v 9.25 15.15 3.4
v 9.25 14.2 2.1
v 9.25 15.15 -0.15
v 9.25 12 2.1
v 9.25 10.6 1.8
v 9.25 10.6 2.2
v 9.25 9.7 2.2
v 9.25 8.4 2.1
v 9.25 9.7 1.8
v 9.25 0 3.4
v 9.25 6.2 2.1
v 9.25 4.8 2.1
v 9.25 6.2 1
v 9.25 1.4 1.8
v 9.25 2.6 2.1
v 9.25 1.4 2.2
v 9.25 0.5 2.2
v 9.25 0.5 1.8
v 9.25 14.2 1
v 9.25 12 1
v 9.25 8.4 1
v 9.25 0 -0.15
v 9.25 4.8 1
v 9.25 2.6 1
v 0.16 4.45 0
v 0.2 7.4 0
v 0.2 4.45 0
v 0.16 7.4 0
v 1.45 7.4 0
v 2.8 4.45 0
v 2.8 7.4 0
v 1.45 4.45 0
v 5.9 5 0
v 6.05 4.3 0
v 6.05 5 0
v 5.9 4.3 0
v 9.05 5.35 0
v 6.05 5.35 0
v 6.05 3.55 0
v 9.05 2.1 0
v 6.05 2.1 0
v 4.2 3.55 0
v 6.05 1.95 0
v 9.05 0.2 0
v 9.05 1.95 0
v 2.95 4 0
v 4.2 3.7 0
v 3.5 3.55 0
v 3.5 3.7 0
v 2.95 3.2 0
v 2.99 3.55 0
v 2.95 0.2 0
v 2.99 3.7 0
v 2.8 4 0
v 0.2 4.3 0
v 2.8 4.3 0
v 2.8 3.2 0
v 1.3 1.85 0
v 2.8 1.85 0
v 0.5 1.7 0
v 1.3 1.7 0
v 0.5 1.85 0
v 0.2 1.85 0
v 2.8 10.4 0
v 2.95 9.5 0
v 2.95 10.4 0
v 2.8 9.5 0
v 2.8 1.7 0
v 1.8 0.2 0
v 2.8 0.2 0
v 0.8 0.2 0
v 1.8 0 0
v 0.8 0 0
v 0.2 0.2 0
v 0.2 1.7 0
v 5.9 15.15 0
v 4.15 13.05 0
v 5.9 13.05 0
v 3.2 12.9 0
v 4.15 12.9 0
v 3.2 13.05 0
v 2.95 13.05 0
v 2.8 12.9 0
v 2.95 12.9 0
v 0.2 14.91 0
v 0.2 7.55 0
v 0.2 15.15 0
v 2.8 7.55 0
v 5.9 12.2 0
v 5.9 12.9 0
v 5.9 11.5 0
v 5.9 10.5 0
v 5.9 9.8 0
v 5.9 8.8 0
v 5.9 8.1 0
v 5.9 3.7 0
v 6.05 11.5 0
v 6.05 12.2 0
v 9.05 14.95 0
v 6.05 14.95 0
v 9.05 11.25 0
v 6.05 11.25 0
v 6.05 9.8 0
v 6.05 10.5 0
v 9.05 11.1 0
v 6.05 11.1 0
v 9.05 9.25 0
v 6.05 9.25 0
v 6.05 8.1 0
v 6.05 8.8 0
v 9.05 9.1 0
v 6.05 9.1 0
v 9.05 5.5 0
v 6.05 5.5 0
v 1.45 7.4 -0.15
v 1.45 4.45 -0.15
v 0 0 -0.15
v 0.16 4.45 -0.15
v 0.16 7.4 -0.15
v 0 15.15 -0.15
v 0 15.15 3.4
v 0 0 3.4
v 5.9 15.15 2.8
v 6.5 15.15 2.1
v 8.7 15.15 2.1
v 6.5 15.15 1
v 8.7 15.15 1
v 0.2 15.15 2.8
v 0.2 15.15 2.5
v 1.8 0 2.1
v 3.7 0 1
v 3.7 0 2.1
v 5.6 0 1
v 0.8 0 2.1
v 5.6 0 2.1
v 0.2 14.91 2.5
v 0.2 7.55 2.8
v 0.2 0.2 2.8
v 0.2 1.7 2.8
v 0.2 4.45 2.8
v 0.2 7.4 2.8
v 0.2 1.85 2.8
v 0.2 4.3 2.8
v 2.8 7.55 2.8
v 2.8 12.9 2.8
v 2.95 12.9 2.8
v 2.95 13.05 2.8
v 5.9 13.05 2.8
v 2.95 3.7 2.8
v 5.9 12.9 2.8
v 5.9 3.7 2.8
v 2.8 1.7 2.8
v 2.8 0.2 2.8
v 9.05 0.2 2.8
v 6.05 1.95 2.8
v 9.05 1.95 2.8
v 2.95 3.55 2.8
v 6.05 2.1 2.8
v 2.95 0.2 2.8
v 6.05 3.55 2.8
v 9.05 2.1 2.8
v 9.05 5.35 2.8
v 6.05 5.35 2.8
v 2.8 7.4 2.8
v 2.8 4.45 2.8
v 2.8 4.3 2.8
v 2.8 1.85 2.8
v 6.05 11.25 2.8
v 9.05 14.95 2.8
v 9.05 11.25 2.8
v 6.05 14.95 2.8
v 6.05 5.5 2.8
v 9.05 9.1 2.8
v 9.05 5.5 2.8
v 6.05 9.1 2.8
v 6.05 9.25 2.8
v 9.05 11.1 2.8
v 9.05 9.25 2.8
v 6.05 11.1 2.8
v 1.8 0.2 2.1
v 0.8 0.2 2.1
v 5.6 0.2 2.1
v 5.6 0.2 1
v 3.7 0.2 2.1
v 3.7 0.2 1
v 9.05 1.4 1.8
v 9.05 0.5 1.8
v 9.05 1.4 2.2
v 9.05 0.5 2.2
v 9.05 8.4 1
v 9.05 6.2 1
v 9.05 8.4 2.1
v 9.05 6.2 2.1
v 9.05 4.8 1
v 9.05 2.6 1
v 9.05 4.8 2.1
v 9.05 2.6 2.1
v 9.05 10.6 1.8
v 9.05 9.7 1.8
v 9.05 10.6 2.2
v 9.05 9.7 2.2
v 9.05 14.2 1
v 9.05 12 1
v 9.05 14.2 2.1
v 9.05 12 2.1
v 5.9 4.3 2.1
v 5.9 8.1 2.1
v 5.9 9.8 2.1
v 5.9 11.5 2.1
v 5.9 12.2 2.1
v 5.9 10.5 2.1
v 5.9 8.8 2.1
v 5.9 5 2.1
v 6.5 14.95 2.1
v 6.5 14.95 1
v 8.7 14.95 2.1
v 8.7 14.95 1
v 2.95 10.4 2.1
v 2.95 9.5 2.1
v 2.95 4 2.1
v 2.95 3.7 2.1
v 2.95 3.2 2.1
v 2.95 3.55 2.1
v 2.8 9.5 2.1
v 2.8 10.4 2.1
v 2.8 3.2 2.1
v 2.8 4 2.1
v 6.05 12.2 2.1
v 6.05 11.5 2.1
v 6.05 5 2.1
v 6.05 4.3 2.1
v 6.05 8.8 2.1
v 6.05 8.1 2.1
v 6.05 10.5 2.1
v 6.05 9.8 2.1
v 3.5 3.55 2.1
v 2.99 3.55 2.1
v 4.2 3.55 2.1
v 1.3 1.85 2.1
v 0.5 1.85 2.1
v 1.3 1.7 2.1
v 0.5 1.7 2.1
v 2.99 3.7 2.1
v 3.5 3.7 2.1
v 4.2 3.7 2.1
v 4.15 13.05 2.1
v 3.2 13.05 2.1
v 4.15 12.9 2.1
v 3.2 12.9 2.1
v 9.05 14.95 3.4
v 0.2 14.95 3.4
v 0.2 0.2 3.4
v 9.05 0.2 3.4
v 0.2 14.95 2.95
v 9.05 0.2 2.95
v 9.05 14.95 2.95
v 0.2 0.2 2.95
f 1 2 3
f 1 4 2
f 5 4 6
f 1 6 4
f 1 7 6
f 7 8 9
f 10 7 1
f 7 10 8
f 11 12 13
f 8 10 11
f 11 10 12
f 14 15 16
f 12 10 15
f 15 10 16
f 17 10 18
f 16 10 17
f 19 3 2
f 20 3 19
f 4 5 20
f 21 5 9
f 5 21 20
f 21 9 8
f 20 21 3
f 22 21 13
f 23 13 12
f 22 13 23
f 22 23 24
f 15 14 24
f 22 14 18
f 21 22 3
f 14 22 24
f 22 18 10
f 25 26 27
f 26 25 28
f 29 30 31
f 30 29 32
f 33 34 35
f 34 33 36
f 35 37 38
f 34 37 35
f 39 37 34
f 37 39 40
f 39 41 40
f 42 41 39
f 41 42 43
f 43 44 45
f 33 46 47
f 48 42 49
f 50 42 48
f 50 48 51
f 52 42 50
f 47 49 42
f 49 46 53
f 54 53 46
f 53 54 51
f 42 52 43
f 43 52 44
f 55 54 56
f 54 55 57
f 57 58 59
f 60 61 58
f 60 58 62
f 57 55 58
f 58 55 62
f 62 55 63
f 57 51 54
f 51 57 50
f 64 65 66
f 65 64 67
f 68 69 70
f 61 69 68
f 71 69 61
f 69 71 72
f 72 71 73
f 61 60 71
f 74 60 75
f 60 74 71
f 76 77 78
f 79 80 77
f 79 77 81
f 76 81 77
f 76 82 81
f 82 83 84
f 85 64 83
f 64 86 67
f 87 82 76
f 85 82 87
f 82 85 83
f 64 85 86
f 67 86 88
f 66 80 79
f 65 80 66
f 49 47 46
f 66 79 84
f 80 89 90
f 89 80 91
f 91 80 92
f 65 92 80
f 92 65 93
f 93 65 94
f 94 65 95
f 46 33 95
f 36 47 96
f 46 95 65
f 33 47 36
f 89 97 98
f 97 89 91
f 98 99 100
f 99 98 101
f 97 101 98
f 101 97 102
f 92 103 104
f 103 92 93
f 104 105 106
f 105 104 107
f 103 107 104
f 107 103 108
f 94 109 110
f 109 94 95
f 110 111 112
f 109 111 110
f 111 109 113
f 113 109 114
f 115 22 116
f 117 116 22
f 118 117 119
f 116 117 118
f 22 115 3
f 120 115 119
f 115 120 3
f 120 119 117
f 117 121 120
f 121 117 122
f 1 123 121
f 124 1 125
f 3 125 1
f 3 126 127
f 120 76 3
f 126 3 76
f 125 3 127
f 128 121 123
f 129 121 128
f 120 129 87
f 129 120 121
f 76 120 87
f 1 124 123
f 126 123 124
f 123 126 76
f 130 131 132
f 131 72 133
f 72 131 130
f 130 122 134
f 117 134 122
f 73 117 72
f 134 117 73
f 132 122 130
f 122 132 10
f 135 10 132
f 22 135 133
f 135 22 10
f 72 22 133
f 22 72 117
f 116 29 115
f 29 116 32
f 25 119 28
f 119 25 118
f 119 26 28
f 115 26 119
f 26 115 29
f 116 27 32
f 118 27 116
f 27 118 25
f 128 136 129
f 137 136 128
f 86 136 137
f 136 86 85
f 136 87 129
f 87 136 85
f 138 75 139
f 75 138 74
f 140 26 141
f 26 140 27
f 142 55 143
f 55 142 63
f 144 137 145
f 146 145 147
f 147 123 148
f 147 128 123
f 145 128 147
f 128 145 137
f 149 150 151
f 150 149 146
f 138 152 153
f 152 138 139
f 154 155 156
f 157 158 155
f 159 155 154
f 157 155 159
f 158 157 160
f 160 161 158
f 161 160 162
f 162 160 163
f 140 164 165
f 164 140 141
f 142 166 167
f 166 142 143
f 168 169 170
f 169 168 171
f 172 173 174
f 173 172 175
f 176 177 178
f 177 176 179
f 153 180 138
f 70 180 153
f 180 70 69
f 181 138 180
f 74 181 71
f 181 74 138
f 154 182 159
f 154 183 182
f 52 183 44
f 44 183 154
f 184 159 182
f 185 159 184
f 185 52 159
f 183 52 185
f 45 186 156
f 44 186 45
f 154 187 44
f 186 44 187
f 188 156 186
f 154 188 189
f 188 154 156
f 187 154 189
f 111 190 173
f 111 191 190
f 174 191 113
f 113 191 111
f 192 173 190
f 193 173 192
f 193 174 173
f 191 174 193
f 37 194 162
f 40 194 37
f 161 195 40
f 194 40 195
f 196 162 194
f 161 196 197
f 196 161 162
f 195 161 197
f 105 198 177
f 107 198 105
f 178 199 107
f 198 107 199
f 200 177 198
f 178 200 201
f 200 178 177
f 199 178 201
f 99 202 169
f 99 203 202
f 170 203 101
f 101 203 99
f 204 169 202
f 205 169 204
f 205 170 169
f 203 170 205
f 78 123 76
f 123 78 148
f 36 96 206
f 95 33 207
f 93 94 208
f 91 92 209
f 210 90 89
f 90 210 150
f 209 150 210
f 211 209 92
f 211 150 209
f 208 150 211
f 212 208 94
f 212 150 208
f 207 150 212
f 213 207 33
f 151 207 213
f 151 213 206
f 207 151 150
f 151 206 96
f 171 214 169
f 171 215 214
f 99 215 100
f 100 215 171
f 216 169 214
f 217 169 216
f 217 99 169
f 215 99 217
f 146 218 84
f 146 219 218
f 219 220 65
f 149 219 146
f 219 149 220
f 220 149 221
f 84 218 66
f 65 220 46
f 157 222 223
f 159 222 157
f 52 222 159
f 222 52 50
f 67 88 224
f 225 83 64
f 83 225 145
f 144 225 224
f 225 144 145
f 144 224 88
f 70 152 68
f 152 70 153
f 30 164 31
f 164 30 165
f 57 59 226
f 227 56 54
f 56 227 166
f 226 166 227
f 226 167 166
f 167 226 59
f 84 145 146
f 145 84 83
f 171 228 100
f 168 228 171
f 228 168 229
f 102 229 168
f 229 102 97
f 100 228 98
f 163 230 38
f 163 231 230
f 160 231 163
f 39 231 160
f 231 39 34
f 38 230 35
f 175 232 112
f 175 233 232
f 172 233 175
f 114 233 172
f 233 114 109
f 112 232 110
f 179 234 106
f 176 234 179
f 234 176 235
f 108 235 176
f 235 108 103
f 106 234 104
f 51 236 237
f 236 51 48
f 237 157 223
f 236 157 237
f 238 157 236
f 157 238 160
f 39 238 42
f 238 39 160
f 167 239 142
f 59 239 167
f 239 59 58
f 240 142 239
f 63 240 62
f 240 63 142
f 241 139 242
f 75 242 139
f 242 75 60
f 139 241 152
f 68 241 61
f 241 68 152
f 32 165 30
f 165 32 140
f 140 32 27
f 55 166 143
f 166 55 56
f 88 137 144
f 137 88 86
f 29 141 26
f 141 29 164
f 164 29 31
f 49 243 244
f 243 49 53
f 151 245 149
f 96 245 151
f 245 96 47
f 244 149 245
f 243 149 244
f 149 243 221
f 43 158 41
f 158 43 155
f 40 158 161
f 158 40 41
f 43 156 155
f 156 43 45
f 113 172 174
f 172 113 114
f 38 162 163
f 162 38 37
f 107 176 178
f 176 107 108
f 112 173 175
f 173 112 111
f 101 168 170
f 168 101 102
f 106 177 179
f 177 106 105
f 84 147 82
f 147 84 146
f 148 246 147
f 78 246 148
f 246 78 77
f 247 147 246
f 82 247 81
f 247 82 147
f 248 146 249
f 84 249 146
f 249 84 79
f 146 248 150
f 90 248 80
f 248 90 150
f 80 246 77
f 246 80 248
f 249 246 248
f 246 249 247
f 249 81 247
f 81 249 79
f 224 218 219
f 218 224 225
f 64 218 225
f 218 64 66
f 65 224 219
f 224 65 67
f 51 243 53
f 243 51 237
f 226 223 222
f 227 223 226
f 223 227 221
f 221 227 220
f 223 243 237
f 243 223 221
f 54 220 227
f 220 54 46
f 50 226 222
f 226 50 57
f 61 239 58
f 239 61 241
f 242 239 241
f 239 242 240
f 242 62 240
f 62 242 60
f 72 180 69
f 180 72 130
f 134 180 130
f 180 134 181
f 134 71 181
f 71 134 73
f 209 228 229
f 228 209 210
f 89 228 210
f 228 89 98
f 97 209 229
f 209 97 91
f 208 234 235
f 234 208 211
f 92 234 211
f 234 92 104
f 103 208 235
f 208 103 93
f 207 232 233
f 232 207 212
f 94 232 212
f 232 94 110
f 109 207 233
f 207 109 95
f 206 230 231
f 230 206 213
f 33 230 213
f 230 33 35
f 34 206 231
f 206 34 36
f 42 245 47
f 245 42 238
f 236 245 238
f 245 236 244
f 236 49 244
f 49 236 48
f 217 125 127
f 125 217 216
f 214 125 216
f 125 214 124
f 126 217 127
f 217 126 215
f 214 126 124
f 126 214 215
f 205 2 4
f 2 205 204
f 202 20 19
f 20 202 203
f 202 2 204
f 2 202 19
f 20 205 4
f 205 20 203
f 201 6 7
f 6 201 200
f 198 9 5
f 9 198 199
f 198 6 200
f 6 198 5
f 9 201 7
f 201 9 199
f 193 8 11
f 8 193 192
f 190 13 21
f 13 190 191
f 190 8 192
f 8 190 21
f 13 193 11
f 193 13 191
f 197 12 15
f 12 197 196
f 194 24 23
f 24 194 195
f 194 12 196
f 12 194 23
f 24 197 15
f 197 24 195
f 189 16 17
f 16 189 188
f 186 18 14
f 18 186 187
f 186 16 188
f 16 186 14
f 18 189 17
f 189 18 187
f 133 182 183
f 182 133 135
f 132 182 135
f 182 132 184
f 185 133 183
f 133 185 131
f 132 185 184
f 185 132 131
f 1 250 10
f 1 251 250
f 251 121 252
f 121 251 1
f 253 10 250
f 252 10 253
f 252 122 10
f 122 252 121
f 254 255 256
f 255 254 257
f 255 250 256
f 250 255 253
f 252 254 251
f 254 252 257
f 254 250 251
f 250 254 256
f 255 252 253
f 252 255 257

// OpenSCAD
// ==============================================================================
// Modelo Parametrico 3D - Casa de Habitacion (Primer Piso / Nivel Calle)
// Generado por Arquitecto Virtual Gemini + CADCraft
// Ubicacion: Av. 4 entre calles 30 y 31, N 30-7, Municipio Independencia, Yaracuy
// ==============================================================================

// PASO 2: PARAMETROS GLOBALES
BUILDING_WIDTH_X = 9.25;
BUILDING_LENGTH_Y = 15.15;
WALL_HEIGHT = 2.80;
EXT_WALL_THICKNESS = 0.20;
INT_WALL_THICKNESS = 0.15;
SLAB_THICKNESS = 0.15;
DOOR_HEIGHT = 2.10;
WINDOW_SILL = 1.00;
WINDOW_HEIGHT = 1.10;
BATH_WINDOW_SILL = 1.80;
BATH_WINDOW_HEIGHT = 0.40;
PARAPET_HEIGHT = 0.45;
EPS = 0.04;

module box_from_coords(x1, y1, z1, x2, y2, z2) {
    translate([min(x1, x2), min(y1, y2), min(z1, z2)])
        cube([abs(x2 - x1), abs(y2 - y1), abs(z2 - z1)]);
}

// 1. Losa de Piso con hueco de escalera
module floor_slab() {
    difference() {
        box_from_coords(0, 0, -SLAB_THICKNESS, BUILDING_WIDTH_X, BUILDING_LENGTH_Y, 0);
        // Hueco de escalera que baja al sotano
        box_from_coords(0.20 - EPS, 4.45, -SLAB_THICKNESS - EPS, 1.45, 7.40, 0 + EPS);
    }
}

// 2. Muros Solidos (sin vanos)
module raw_walls() {
    // Muros Exteriores
    box_from_coords(0.00, 0.00, 0, 0.20, BUILDING_LENGTH_Y, WALL_HEIGHT);
    box_from_coords(0.00, 0.00, 0, BUILDING_WIDTH_X, 0.20, WALL_HEIGHT);
    box_from_coords(BUILDING_WIDTH_X - EXT_WALL_THICKNESS, 0.00, 0, BUILDING_WIDTH_X, BUILDING_LENGTH_Y, WALL_HEIGHT);
    box_from_coords(5.90, BUILDING_LENGTH_Y - EXT_WALL_THICKNESS, 0, BUILDING_WIDTH_X, BUILDING_LENGTH_Y, WALL_HEIGHT);

    // Muros Longitudinales Interiores
    box_from_coords(2.80, 0.20, 0, 2.95, 12.90, WALL_HEIGHT);
    box_from_coords(5.90, 3.55, 0, 6.05, 14.95, WALL_HEIGHT);

    // Muros Transversales Interiores
    box_from_coords(0.20, 1.70, 0, 2.80, 1.85, WALL_HEIGHT); // Lavadero - Cocina
    box_from_coords(0.20, 4.30, 0, 2.80, 4.45, WALL_HEIGHT); // Cocina - Escalera
    box_from_coords(0.20, 7.40, 0, 2.80, 7.55, WALL_HEIGHT); // Escalera - Garaje
    box_from_coords(2.95, 3.55, 0, 5.90, 3.70, WALL_HEIGHT); // Hab 4 - Comedor
    box_from_coords(6.05, 1.95, 0, 9.05, 2.10, WALL_HEIGHT); // Bano 2 - Hab 3
    box_from_coords(6.05, 5.35, 0, 9.05, 5.50, WALL_HEIGHT); // Hab 3 - Hab 2
    box_from_coords(6.05, 9.10, 0, 9.05, 9.25, WALL_HEIGHT); // Hab 2 - Bano 1
    box_from_coords(6.05, 11.10, 0, 9.05, 11.25, WALL_HEIGHT); // Bano 1 - Hab 1
    box_from_coords(2.95, 12.90, 0, 5.90, 13.05, WALL_HEIGHT); // Porche - Sala
}

// 3. Vanos (Cortes Booleanos)
module openings() {
    // Puertas
    box_from_coords(3.20, 12.90 - EPS, 0, 4.15, 13.05 + EPS, DOOR_HEIGHT); // Principal
    box_from_coords(2.80 - EPS, 9.50, 0, 2.95 + EPS, 10.40, DOOR_HEIGHT); // Garaje - Sala
    box_from_coords(2.80 - EPS, 3.20, 0, 2.95 + EPS, 4.00, DOOR_HEIGHT); // Cocina
    box_from_coords(0.50, 1.70 - EPS, 0, 1.30, 1.85 + EPS, DOOR_HEIGHT); // Lavadero Int
    box_from_coords(0.80, 0.00 - EPS, 0, 1.80, 0.20 + EPS, DOOR_HEIGHT); // Lavadero Ext
    box_from_coords(5.90 - EPS, 11.50, 0, 6.05 + EPS, 12.20, DOOR_HEIGHT); // Hab 1
    box_from_coords(5.90 - EPS, 9.80, 0, 6.05 + EPS, 10.50, DOOR_HEIGHT); // Bano 1
    box_from_coords(5.90 - EPS, 8.10, 0, 6.05 + EPS, 8.80, DOOR_HEIGHT); // Hab 2
    box_from_coords(5.90 - EPS, 4.30, 0, 6.05 + EPS, 5.00, DOOR_HEIGHT); // Hab 3
    box_from_coords(5.90 - EPS, 1.00, 0, 6.05 + EPS, 1.70, DOOR_HEIGHT); // Bano 2
    box_from_coords(3.50, 3.55 - EPS, 0, 4.20, 3.70 + EPS, DOOR_HEIGHT); // Hab 4
    box_from_coords(0.20, 15.15 - EXT_WALL_THICKNESS - EPS, 0, 2.80, 15.15 + EPS, 2.50); // Porton Garaje

    // Ventanas
    box_from_coords(6.50, 14.95 - EPS, WINDOW_SILL, 8.70, 15.15 + EPS, WINDOW_SILL + WINDOW_HEIGHT); // Hab 1 Frontal
    box_from_coords(9.05 - EPS, 12.00, WINDOW_SILL, 9.25 + EPS, 14.20, WINDOW_SILL + WINDOW_HEIGHT); // Hab 1 Lateral
    box_from_coords(9.05 - EPS, 9.70, BATH_WINDOW_SILL, 9.25 + EPS, 10.60, BATH_WINDOW_SILL + BATH_WINDOW_HEIGHT); // B1 Lateral
    box_from_coords(9.05 - EPS, 6.20, WINDOW_SILL, 9.25 + EPS, 8.40, WINDOW_SILL + WINDOW_HEIGHT); // Hab 2 Lateral
    box_from_coords(9.05 - EPS, 2.60, WINDOW_SILL, 9.25 + EPS, 4.80, WINDOW_SILL + WINDOW_HEIGHT); // Hab 3 Lateral
    box_from_coords(9.05 - EPS, 0.50, BATH_WINDOW_SILL, 9.25 + EPS, 1.40, BATH_WINDOW_SILL + BATH_WINDOW_HEIGHT); // B2 Lateral
    box_from_coords(3.70, 0.00 - EPS, WINDOW_SILL, 5.60, 0.20 + EPS, WINDOW_SILL + WINDOW_HEIGHT); // Hab 4 Posterior
}

module finished_walls() {
    difference() {
        raw_walls();
        openings();
    }
}

// 4. Cubierta y Parapeto
module roof_structure() {
    // Losa de techo
    box_from_coords(0, 0, WALL_HEIGHT, BUILDING_WIDTH_X, BUILDING_LENGTH_Y, WALL_HEIGHT + SLAB_THICKNESS);

    // Parapeto perimetral
    difference() {
        box_from_coords(0, 0, WALL_HEIGHT + SLAB_THICKNESS, BUILDING_WIDTH_X, BUILDING_LENGTH_Y, WALL_HEIGHT + SLAB_THICKNESS + PARAPET_HEIGHT);
        box_from_coords(EXT_WALL_THICKNESS, EXT_WALL_THICKNESS, WALL_HEIGHT + SLAB_THICKNESS - EPS, BUILDING_WIDTH_X - EXT_WALL_THICKNESS, BUILDING_LENGTH_Y - EXT_WALL_THICKNESS, WALL_HEIGHT + SLAB_THICKNESS + PARAPET_HEIGHT + EPS);
    }
}

// 5. Ensamblaje Final
color([0.75, 0.75, 0.75]) floor_slab();
color([0.95, 0.95, 0.95]) finished_walls();
color([0.65, 0.65, 0.70]) roof_structure();
